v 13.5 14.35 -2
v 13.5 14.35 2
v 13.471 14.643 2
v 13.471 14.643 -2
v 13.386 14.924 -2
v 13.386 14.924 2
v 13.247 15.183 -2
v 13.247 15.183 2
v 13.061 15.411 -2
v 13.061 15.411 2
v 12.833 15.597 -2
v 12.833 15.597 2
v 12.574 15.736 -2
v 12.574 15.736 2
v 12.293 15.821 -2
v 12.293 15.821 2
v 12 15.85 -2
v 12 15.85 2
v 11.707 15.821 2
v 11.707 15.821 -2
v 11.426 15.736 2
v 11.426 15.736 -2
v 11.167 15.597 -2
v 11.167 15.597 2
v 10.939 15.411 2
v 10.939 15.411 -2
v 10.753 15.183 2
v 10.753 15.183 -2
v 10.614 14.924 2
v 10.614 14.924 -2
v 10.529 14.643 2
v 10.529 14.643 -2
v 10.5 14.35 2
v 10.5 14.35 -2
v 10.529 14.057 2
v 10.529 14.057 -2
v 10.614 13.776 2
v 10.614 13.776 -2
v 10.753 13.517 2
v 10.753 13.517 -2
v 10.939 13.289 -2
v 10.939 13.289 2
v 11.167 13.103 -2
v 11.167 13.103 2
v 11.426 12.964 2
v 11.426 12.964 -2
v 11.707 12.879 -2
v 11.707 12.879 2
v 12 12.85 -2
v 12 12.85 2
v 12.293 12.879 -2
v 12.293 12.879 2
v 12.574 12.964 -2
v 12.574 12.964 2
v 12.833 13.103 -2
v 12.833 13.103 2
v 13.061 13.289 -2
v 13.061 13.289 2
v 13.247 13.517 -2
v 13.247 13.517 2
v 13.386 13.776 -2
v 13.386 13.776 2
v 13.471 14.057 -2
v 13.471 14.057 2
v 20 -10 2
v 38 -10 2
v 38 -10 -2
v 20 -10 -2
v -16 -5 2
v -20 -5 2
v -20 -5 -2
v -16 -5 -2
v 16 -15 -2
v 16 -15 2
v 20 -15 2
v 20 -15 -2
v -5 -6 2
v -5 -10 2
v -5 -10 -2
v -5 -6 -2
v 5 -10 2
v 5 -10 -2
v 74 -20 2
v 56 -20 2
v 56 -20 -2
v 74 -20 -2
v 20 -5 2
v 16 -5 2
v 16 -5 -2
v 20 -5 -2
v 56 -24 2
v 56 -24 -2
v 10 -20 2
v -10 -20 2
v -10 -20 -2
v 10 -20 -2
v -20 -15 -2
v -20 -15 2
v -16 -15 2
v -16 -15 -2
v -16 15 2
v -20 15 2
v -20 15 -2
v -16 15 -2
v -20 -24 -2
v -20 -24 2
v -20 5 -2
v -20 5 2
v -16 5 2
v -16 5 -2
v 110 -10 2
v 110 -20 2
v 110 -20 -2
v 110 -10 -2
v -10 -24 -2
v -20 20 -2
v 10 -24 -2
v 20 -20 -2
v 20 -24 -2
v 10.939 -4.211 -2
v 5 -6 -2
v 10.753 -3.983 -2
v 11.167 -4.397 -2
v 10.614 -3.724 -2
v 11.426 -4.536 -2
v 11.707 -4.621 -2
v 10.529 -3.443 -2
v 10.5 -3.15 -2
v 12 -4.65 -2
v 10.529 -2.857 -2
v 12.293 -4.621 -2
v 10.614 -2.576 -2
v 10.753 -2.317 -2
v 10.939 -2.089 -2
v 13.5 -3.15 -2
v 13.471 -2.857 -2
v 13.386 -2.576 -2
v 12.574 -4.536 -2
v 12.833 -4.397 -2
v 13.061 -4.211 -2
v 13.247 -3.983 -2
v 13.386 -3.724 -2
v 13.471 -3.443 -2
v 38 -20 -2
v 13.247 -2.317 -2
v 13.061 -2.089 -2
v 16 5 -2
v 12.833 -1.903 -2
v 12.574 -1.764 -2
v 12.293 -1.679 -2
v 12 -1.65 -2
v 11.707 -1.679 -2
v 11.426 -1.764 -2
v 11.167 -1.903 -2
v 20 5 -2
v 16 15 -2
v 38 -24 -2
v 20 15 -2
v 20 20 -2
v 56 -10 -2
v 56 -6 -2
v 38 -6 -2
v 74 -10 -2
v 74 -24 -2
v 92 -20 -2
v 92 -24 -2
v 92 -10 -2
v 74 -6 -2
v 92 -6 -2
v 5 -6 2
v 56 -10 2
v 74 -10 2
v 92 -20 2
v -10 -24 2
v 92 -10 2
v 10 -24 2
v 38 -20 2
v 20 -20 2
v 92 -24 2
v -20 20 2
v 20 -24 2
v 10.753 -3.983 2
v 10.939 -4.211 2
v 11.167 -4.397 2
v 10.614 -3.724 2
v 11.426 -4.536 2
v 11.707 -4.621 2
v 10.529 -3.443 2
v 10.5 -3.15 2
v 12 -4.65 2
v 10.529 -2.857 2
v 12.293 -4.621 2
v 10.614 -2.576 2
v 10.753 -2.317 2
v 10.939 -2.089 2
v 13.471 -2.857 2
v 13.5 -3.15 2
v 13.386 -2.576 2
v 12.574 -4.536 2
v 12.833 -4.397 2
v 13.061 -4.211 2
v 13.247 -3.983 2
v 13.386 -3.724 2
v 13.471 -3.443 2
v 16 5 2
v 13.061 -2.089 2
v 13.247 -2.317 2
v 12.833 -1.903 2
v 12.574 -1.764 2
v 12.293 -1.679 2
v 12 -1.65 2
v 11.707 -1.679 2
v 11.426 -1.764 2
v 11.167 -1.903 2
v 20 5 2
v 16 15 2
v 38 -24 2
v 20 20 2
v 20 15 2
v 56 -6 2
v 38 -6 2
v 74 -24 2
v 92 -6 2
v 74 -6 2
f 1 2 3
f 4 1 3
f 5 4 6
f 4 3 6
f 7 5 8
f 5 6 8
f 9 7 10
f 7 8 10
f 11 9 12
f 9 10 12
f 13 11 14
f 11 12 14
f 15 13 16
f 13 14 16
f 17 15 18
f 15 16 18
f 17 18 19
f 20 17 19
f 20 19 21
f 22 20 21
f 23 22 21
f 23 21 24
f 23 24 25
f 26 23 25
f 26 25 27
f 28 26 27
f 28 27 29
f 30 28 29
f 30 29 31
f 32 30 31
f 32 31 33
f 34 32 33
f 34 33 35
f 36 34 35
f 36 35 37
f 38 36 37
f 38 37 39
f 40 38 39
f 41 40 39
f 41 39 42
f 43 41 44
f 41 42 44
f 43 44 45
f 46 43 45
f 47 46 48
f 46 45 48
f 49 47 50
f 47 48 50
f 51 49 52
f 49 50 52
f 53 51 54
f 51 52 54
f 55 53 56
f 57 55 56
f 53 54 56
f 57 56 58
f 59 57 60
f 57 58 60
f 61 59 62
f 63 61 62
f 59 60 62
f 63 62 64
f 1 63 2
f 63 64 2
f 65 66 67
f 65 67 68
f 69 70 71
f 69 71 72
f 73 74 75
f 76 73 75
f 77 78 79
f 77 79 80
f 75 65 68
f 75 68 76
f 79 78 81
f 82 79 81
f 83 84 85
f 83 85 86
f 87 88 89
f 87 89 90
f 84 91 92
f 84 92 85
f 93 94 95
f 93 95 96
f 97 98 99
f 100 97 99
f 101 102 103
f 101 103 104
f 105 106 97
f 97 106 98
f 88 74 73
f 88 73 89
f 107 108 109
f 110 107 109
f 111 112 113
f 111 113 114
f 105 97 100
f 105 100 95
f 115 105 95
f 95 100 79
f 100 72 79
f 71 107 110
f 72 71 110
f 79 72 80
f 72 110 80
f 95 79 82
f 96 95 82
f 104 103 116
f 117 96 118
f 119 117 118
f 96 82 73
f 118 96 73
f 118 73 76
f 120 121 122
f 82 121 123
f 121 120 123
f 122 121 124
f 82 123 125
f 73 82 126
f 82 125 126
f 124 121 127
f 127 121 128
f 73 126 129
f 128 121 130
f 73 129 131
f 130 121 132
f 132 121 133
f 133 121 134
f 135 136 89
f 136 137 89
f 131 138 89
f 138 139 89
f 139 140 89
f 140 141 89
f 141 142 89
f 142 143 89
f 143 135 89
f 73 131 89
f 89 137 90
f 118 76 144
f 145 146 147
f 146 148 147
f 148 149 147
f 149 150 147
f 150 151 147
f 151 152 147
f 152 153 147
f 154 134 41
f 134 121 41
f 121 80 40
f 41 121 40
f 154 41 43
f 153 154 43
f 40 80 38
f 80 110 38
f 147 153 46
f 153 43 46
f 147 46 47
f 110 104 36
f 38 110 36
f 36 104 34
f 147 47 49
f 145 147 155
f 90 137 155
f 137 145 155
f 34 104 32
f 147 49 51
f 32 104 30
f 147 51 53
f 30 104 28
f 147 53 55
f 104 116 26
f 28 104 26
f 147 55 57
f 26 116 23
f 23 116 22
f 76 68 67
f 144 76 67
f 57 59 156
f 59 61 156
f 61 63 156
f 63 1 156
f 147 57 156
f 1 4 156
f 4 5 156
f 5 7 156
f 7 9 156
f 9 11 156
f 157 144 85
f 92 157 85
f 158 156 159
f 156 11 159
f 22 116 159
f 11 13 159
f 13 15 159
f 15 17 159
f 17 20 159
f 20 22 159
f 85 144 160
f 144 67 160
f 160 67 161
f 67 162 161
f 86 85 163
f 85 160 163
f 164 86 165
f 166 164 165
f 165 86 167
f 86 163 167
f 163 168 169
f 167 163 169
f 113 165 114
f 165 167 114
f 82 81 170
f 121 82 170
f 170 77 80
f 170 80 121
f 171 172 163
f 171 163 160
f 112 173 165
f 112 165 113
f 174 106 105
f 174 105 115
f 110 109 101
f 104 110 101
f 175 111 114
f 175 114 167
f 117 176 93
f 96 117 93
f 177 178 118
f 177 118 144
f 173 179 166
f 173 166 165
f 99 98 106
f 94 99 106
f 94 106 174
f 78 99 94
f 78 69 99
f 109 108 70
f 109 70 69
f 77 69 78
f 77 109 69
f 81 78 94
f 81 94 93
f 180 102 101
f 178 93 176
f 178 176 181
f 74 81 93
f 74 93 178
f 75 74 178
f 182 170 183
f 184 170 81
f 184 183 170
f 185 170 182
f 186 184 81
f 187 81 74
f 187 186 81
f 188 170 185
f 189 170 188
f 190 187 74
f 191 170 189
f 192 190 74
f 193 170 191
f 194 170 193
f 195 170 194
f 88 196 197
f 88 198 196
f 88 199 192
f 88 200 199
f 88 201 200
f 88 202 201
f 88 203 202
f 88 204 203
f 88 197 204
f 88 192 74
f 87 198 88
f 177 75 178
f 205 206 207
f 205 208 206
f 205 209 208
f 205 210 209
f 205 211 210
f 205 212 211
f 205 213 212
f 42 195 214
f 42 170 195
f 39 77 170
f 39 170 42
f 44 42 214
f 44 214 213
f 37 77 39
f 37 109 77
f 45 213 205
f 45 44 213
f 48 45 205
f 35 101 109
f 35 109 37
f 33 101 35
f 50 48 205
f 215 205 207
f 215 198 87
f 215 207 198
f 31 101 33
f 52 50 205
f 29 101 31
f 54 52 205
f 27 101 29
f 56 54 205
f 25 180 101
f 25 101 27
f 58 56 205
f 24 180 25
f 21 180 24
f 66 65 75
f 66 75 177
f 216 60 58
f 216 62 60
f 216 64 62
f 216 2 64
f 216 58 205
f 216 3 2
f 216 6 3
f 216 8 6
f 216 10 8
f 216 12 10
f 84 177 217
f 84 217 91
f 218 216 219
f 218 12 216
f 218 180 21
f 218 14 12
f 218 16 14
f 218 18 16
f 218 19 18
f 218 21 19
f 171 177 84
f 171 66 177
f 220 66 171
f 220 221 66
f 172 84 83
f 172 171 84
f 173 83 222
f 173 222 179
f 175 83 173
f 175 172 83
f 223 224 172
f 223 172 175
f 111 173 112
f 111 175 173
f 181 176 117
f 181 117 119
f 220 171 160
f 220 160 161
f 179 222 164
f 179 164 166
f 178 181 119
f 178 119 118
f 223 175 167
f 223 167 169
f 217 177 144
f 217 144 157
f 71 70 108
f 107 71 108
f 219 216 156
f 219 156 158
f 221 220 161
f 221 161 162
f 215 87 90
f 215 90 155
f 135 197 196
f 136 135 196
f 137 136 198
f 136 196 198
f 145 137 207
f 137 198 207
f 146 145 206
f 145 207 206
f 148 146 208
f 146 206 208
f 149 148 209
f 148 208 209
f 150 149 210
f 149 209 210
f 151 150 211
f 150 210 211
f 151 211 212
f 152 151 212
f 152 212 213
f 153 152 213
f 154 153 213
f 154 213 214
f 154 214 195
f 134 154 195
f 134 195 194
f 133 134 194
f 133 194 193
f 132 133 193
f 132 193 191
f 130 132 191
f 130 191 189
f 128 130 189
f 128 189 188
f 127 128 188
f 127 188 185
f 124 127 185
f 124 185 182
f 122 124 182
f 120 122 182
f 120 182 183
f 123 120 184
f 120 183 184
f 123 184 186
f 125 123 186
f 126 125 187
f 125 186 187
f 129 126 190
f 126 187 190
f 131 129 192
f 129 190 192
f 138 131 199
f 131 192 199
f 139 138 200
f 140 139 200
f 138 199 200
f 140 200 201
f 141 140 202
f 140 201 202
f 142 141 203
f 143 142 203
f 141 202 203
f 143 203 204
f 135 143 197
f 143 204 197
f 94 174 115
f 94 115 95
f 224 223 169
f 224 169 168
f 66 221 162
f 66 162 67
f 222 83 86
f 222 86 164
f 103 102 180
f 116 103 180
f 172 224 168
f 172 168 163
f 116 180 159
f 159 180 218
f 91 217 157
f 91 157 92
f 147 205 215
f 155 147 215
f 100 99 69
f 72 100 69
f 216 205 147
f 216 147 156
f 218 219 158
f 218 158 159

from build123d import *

# Parameters (mm, degrees)
SKETCH1_W           = 40
SKETCH1_H           = 40
BOSS_EXTRUDE1_DEPTH = 2
SKETCH2_R           = 1.5
CUT_EXTRUDE1_DEPTH  = 29.565713714
SKETCH3_W           = 4
SKETCH3_H           = 10
SKETCH3_W_2         = 10
SKETCH3_H_2         = 4
CUT_EXTRUDE2_DEPTH  = 29.565713714
SKETCH4_W           = 10
SKETCH4_H           = 4
BOSS_EXTRUDE2_DEPTH = 4
BOSS_EXTRUDE3_DEPTH = 4


with BuildPart() as part:
    # Sketch1 → Boss-Extrude1 (new, symmetric)
    with BuildSketch(Plane.XY):
        Rectangle(SKETCH1_W, SKETCH1_H)
    extrude(amount=BOSS_EXTRUDE1_DEPTH, both=True)

    # Sketch2 → Cut-Extrude1 (cut, through all)
    with BuildSketch(Plane.XY.offset(2)):
        with Locations((12, 14.35)):
            Circle(SKETCH2_R)
        with Locations((12, -3.15)):
            Circle(SKETCH2_R)
    extrude(amount=-CUT_EXTRUDE1_DEPTH, mode=Mode.SUBTRACT)

    # Sketch3 → Cut-Extrude2 (cut, through all)
    with BuildSketch(Plane.XY.offset(2)):
        with Locations((18, 10)):
            Rectangle(SKETCH3_W, SKETCH3_H)
        with Locations((-18, 10)):
            Rectangle(SKETCH3_W, SKETCH3_H)
        with Locations((-18, -10)):
            Rectangle(SKETCH3_W, SKETCH3_H)
        with Locations((18, -10)):
            Rectangle(SKETCH3_W, SKETCH3_H)
        with Locations((0, -8)):
            Rectangle(SKETCH3_W_2, SKETCH3_H_2)
    extrude(amount=-CUT_EXTRUDE2_DEPTH, mode=Mode.SUBTRACT)

    # Sketch4 → Boss-Extrude2 (add)
    with BuildSketch(Plane.XY.offset(2)):
        with Locations((-15, -22)):
            Rectangle(SKETCH4_W, SKETCH4_H)
        with Locations((15, -22)):
            Rectangle(SKETCH4_W, SKETCH4_H)
    extrude(amount=-BOSS_EXTRUDE2_DEPTH)

    # Sketch5 → Boss-Extrude3 (add)
    with BuildSketch(Plane.XY.offset(2)):
        Polygon((20, -20), (38, -20), (38, -24), (56, -24), (56, -20), (74, -20), (74, -24), (92, -24), (92, -20), (110, -20), (110, -10), (92, -10), (92, -6), (74, -6), (74, -10), (56, -10), (56, -6), (38, -6), (38, -10), (20, -10), align=None)
    extrude(amount=-BOSS_EXTRUDE3_DEPTH)


solid = part.part
